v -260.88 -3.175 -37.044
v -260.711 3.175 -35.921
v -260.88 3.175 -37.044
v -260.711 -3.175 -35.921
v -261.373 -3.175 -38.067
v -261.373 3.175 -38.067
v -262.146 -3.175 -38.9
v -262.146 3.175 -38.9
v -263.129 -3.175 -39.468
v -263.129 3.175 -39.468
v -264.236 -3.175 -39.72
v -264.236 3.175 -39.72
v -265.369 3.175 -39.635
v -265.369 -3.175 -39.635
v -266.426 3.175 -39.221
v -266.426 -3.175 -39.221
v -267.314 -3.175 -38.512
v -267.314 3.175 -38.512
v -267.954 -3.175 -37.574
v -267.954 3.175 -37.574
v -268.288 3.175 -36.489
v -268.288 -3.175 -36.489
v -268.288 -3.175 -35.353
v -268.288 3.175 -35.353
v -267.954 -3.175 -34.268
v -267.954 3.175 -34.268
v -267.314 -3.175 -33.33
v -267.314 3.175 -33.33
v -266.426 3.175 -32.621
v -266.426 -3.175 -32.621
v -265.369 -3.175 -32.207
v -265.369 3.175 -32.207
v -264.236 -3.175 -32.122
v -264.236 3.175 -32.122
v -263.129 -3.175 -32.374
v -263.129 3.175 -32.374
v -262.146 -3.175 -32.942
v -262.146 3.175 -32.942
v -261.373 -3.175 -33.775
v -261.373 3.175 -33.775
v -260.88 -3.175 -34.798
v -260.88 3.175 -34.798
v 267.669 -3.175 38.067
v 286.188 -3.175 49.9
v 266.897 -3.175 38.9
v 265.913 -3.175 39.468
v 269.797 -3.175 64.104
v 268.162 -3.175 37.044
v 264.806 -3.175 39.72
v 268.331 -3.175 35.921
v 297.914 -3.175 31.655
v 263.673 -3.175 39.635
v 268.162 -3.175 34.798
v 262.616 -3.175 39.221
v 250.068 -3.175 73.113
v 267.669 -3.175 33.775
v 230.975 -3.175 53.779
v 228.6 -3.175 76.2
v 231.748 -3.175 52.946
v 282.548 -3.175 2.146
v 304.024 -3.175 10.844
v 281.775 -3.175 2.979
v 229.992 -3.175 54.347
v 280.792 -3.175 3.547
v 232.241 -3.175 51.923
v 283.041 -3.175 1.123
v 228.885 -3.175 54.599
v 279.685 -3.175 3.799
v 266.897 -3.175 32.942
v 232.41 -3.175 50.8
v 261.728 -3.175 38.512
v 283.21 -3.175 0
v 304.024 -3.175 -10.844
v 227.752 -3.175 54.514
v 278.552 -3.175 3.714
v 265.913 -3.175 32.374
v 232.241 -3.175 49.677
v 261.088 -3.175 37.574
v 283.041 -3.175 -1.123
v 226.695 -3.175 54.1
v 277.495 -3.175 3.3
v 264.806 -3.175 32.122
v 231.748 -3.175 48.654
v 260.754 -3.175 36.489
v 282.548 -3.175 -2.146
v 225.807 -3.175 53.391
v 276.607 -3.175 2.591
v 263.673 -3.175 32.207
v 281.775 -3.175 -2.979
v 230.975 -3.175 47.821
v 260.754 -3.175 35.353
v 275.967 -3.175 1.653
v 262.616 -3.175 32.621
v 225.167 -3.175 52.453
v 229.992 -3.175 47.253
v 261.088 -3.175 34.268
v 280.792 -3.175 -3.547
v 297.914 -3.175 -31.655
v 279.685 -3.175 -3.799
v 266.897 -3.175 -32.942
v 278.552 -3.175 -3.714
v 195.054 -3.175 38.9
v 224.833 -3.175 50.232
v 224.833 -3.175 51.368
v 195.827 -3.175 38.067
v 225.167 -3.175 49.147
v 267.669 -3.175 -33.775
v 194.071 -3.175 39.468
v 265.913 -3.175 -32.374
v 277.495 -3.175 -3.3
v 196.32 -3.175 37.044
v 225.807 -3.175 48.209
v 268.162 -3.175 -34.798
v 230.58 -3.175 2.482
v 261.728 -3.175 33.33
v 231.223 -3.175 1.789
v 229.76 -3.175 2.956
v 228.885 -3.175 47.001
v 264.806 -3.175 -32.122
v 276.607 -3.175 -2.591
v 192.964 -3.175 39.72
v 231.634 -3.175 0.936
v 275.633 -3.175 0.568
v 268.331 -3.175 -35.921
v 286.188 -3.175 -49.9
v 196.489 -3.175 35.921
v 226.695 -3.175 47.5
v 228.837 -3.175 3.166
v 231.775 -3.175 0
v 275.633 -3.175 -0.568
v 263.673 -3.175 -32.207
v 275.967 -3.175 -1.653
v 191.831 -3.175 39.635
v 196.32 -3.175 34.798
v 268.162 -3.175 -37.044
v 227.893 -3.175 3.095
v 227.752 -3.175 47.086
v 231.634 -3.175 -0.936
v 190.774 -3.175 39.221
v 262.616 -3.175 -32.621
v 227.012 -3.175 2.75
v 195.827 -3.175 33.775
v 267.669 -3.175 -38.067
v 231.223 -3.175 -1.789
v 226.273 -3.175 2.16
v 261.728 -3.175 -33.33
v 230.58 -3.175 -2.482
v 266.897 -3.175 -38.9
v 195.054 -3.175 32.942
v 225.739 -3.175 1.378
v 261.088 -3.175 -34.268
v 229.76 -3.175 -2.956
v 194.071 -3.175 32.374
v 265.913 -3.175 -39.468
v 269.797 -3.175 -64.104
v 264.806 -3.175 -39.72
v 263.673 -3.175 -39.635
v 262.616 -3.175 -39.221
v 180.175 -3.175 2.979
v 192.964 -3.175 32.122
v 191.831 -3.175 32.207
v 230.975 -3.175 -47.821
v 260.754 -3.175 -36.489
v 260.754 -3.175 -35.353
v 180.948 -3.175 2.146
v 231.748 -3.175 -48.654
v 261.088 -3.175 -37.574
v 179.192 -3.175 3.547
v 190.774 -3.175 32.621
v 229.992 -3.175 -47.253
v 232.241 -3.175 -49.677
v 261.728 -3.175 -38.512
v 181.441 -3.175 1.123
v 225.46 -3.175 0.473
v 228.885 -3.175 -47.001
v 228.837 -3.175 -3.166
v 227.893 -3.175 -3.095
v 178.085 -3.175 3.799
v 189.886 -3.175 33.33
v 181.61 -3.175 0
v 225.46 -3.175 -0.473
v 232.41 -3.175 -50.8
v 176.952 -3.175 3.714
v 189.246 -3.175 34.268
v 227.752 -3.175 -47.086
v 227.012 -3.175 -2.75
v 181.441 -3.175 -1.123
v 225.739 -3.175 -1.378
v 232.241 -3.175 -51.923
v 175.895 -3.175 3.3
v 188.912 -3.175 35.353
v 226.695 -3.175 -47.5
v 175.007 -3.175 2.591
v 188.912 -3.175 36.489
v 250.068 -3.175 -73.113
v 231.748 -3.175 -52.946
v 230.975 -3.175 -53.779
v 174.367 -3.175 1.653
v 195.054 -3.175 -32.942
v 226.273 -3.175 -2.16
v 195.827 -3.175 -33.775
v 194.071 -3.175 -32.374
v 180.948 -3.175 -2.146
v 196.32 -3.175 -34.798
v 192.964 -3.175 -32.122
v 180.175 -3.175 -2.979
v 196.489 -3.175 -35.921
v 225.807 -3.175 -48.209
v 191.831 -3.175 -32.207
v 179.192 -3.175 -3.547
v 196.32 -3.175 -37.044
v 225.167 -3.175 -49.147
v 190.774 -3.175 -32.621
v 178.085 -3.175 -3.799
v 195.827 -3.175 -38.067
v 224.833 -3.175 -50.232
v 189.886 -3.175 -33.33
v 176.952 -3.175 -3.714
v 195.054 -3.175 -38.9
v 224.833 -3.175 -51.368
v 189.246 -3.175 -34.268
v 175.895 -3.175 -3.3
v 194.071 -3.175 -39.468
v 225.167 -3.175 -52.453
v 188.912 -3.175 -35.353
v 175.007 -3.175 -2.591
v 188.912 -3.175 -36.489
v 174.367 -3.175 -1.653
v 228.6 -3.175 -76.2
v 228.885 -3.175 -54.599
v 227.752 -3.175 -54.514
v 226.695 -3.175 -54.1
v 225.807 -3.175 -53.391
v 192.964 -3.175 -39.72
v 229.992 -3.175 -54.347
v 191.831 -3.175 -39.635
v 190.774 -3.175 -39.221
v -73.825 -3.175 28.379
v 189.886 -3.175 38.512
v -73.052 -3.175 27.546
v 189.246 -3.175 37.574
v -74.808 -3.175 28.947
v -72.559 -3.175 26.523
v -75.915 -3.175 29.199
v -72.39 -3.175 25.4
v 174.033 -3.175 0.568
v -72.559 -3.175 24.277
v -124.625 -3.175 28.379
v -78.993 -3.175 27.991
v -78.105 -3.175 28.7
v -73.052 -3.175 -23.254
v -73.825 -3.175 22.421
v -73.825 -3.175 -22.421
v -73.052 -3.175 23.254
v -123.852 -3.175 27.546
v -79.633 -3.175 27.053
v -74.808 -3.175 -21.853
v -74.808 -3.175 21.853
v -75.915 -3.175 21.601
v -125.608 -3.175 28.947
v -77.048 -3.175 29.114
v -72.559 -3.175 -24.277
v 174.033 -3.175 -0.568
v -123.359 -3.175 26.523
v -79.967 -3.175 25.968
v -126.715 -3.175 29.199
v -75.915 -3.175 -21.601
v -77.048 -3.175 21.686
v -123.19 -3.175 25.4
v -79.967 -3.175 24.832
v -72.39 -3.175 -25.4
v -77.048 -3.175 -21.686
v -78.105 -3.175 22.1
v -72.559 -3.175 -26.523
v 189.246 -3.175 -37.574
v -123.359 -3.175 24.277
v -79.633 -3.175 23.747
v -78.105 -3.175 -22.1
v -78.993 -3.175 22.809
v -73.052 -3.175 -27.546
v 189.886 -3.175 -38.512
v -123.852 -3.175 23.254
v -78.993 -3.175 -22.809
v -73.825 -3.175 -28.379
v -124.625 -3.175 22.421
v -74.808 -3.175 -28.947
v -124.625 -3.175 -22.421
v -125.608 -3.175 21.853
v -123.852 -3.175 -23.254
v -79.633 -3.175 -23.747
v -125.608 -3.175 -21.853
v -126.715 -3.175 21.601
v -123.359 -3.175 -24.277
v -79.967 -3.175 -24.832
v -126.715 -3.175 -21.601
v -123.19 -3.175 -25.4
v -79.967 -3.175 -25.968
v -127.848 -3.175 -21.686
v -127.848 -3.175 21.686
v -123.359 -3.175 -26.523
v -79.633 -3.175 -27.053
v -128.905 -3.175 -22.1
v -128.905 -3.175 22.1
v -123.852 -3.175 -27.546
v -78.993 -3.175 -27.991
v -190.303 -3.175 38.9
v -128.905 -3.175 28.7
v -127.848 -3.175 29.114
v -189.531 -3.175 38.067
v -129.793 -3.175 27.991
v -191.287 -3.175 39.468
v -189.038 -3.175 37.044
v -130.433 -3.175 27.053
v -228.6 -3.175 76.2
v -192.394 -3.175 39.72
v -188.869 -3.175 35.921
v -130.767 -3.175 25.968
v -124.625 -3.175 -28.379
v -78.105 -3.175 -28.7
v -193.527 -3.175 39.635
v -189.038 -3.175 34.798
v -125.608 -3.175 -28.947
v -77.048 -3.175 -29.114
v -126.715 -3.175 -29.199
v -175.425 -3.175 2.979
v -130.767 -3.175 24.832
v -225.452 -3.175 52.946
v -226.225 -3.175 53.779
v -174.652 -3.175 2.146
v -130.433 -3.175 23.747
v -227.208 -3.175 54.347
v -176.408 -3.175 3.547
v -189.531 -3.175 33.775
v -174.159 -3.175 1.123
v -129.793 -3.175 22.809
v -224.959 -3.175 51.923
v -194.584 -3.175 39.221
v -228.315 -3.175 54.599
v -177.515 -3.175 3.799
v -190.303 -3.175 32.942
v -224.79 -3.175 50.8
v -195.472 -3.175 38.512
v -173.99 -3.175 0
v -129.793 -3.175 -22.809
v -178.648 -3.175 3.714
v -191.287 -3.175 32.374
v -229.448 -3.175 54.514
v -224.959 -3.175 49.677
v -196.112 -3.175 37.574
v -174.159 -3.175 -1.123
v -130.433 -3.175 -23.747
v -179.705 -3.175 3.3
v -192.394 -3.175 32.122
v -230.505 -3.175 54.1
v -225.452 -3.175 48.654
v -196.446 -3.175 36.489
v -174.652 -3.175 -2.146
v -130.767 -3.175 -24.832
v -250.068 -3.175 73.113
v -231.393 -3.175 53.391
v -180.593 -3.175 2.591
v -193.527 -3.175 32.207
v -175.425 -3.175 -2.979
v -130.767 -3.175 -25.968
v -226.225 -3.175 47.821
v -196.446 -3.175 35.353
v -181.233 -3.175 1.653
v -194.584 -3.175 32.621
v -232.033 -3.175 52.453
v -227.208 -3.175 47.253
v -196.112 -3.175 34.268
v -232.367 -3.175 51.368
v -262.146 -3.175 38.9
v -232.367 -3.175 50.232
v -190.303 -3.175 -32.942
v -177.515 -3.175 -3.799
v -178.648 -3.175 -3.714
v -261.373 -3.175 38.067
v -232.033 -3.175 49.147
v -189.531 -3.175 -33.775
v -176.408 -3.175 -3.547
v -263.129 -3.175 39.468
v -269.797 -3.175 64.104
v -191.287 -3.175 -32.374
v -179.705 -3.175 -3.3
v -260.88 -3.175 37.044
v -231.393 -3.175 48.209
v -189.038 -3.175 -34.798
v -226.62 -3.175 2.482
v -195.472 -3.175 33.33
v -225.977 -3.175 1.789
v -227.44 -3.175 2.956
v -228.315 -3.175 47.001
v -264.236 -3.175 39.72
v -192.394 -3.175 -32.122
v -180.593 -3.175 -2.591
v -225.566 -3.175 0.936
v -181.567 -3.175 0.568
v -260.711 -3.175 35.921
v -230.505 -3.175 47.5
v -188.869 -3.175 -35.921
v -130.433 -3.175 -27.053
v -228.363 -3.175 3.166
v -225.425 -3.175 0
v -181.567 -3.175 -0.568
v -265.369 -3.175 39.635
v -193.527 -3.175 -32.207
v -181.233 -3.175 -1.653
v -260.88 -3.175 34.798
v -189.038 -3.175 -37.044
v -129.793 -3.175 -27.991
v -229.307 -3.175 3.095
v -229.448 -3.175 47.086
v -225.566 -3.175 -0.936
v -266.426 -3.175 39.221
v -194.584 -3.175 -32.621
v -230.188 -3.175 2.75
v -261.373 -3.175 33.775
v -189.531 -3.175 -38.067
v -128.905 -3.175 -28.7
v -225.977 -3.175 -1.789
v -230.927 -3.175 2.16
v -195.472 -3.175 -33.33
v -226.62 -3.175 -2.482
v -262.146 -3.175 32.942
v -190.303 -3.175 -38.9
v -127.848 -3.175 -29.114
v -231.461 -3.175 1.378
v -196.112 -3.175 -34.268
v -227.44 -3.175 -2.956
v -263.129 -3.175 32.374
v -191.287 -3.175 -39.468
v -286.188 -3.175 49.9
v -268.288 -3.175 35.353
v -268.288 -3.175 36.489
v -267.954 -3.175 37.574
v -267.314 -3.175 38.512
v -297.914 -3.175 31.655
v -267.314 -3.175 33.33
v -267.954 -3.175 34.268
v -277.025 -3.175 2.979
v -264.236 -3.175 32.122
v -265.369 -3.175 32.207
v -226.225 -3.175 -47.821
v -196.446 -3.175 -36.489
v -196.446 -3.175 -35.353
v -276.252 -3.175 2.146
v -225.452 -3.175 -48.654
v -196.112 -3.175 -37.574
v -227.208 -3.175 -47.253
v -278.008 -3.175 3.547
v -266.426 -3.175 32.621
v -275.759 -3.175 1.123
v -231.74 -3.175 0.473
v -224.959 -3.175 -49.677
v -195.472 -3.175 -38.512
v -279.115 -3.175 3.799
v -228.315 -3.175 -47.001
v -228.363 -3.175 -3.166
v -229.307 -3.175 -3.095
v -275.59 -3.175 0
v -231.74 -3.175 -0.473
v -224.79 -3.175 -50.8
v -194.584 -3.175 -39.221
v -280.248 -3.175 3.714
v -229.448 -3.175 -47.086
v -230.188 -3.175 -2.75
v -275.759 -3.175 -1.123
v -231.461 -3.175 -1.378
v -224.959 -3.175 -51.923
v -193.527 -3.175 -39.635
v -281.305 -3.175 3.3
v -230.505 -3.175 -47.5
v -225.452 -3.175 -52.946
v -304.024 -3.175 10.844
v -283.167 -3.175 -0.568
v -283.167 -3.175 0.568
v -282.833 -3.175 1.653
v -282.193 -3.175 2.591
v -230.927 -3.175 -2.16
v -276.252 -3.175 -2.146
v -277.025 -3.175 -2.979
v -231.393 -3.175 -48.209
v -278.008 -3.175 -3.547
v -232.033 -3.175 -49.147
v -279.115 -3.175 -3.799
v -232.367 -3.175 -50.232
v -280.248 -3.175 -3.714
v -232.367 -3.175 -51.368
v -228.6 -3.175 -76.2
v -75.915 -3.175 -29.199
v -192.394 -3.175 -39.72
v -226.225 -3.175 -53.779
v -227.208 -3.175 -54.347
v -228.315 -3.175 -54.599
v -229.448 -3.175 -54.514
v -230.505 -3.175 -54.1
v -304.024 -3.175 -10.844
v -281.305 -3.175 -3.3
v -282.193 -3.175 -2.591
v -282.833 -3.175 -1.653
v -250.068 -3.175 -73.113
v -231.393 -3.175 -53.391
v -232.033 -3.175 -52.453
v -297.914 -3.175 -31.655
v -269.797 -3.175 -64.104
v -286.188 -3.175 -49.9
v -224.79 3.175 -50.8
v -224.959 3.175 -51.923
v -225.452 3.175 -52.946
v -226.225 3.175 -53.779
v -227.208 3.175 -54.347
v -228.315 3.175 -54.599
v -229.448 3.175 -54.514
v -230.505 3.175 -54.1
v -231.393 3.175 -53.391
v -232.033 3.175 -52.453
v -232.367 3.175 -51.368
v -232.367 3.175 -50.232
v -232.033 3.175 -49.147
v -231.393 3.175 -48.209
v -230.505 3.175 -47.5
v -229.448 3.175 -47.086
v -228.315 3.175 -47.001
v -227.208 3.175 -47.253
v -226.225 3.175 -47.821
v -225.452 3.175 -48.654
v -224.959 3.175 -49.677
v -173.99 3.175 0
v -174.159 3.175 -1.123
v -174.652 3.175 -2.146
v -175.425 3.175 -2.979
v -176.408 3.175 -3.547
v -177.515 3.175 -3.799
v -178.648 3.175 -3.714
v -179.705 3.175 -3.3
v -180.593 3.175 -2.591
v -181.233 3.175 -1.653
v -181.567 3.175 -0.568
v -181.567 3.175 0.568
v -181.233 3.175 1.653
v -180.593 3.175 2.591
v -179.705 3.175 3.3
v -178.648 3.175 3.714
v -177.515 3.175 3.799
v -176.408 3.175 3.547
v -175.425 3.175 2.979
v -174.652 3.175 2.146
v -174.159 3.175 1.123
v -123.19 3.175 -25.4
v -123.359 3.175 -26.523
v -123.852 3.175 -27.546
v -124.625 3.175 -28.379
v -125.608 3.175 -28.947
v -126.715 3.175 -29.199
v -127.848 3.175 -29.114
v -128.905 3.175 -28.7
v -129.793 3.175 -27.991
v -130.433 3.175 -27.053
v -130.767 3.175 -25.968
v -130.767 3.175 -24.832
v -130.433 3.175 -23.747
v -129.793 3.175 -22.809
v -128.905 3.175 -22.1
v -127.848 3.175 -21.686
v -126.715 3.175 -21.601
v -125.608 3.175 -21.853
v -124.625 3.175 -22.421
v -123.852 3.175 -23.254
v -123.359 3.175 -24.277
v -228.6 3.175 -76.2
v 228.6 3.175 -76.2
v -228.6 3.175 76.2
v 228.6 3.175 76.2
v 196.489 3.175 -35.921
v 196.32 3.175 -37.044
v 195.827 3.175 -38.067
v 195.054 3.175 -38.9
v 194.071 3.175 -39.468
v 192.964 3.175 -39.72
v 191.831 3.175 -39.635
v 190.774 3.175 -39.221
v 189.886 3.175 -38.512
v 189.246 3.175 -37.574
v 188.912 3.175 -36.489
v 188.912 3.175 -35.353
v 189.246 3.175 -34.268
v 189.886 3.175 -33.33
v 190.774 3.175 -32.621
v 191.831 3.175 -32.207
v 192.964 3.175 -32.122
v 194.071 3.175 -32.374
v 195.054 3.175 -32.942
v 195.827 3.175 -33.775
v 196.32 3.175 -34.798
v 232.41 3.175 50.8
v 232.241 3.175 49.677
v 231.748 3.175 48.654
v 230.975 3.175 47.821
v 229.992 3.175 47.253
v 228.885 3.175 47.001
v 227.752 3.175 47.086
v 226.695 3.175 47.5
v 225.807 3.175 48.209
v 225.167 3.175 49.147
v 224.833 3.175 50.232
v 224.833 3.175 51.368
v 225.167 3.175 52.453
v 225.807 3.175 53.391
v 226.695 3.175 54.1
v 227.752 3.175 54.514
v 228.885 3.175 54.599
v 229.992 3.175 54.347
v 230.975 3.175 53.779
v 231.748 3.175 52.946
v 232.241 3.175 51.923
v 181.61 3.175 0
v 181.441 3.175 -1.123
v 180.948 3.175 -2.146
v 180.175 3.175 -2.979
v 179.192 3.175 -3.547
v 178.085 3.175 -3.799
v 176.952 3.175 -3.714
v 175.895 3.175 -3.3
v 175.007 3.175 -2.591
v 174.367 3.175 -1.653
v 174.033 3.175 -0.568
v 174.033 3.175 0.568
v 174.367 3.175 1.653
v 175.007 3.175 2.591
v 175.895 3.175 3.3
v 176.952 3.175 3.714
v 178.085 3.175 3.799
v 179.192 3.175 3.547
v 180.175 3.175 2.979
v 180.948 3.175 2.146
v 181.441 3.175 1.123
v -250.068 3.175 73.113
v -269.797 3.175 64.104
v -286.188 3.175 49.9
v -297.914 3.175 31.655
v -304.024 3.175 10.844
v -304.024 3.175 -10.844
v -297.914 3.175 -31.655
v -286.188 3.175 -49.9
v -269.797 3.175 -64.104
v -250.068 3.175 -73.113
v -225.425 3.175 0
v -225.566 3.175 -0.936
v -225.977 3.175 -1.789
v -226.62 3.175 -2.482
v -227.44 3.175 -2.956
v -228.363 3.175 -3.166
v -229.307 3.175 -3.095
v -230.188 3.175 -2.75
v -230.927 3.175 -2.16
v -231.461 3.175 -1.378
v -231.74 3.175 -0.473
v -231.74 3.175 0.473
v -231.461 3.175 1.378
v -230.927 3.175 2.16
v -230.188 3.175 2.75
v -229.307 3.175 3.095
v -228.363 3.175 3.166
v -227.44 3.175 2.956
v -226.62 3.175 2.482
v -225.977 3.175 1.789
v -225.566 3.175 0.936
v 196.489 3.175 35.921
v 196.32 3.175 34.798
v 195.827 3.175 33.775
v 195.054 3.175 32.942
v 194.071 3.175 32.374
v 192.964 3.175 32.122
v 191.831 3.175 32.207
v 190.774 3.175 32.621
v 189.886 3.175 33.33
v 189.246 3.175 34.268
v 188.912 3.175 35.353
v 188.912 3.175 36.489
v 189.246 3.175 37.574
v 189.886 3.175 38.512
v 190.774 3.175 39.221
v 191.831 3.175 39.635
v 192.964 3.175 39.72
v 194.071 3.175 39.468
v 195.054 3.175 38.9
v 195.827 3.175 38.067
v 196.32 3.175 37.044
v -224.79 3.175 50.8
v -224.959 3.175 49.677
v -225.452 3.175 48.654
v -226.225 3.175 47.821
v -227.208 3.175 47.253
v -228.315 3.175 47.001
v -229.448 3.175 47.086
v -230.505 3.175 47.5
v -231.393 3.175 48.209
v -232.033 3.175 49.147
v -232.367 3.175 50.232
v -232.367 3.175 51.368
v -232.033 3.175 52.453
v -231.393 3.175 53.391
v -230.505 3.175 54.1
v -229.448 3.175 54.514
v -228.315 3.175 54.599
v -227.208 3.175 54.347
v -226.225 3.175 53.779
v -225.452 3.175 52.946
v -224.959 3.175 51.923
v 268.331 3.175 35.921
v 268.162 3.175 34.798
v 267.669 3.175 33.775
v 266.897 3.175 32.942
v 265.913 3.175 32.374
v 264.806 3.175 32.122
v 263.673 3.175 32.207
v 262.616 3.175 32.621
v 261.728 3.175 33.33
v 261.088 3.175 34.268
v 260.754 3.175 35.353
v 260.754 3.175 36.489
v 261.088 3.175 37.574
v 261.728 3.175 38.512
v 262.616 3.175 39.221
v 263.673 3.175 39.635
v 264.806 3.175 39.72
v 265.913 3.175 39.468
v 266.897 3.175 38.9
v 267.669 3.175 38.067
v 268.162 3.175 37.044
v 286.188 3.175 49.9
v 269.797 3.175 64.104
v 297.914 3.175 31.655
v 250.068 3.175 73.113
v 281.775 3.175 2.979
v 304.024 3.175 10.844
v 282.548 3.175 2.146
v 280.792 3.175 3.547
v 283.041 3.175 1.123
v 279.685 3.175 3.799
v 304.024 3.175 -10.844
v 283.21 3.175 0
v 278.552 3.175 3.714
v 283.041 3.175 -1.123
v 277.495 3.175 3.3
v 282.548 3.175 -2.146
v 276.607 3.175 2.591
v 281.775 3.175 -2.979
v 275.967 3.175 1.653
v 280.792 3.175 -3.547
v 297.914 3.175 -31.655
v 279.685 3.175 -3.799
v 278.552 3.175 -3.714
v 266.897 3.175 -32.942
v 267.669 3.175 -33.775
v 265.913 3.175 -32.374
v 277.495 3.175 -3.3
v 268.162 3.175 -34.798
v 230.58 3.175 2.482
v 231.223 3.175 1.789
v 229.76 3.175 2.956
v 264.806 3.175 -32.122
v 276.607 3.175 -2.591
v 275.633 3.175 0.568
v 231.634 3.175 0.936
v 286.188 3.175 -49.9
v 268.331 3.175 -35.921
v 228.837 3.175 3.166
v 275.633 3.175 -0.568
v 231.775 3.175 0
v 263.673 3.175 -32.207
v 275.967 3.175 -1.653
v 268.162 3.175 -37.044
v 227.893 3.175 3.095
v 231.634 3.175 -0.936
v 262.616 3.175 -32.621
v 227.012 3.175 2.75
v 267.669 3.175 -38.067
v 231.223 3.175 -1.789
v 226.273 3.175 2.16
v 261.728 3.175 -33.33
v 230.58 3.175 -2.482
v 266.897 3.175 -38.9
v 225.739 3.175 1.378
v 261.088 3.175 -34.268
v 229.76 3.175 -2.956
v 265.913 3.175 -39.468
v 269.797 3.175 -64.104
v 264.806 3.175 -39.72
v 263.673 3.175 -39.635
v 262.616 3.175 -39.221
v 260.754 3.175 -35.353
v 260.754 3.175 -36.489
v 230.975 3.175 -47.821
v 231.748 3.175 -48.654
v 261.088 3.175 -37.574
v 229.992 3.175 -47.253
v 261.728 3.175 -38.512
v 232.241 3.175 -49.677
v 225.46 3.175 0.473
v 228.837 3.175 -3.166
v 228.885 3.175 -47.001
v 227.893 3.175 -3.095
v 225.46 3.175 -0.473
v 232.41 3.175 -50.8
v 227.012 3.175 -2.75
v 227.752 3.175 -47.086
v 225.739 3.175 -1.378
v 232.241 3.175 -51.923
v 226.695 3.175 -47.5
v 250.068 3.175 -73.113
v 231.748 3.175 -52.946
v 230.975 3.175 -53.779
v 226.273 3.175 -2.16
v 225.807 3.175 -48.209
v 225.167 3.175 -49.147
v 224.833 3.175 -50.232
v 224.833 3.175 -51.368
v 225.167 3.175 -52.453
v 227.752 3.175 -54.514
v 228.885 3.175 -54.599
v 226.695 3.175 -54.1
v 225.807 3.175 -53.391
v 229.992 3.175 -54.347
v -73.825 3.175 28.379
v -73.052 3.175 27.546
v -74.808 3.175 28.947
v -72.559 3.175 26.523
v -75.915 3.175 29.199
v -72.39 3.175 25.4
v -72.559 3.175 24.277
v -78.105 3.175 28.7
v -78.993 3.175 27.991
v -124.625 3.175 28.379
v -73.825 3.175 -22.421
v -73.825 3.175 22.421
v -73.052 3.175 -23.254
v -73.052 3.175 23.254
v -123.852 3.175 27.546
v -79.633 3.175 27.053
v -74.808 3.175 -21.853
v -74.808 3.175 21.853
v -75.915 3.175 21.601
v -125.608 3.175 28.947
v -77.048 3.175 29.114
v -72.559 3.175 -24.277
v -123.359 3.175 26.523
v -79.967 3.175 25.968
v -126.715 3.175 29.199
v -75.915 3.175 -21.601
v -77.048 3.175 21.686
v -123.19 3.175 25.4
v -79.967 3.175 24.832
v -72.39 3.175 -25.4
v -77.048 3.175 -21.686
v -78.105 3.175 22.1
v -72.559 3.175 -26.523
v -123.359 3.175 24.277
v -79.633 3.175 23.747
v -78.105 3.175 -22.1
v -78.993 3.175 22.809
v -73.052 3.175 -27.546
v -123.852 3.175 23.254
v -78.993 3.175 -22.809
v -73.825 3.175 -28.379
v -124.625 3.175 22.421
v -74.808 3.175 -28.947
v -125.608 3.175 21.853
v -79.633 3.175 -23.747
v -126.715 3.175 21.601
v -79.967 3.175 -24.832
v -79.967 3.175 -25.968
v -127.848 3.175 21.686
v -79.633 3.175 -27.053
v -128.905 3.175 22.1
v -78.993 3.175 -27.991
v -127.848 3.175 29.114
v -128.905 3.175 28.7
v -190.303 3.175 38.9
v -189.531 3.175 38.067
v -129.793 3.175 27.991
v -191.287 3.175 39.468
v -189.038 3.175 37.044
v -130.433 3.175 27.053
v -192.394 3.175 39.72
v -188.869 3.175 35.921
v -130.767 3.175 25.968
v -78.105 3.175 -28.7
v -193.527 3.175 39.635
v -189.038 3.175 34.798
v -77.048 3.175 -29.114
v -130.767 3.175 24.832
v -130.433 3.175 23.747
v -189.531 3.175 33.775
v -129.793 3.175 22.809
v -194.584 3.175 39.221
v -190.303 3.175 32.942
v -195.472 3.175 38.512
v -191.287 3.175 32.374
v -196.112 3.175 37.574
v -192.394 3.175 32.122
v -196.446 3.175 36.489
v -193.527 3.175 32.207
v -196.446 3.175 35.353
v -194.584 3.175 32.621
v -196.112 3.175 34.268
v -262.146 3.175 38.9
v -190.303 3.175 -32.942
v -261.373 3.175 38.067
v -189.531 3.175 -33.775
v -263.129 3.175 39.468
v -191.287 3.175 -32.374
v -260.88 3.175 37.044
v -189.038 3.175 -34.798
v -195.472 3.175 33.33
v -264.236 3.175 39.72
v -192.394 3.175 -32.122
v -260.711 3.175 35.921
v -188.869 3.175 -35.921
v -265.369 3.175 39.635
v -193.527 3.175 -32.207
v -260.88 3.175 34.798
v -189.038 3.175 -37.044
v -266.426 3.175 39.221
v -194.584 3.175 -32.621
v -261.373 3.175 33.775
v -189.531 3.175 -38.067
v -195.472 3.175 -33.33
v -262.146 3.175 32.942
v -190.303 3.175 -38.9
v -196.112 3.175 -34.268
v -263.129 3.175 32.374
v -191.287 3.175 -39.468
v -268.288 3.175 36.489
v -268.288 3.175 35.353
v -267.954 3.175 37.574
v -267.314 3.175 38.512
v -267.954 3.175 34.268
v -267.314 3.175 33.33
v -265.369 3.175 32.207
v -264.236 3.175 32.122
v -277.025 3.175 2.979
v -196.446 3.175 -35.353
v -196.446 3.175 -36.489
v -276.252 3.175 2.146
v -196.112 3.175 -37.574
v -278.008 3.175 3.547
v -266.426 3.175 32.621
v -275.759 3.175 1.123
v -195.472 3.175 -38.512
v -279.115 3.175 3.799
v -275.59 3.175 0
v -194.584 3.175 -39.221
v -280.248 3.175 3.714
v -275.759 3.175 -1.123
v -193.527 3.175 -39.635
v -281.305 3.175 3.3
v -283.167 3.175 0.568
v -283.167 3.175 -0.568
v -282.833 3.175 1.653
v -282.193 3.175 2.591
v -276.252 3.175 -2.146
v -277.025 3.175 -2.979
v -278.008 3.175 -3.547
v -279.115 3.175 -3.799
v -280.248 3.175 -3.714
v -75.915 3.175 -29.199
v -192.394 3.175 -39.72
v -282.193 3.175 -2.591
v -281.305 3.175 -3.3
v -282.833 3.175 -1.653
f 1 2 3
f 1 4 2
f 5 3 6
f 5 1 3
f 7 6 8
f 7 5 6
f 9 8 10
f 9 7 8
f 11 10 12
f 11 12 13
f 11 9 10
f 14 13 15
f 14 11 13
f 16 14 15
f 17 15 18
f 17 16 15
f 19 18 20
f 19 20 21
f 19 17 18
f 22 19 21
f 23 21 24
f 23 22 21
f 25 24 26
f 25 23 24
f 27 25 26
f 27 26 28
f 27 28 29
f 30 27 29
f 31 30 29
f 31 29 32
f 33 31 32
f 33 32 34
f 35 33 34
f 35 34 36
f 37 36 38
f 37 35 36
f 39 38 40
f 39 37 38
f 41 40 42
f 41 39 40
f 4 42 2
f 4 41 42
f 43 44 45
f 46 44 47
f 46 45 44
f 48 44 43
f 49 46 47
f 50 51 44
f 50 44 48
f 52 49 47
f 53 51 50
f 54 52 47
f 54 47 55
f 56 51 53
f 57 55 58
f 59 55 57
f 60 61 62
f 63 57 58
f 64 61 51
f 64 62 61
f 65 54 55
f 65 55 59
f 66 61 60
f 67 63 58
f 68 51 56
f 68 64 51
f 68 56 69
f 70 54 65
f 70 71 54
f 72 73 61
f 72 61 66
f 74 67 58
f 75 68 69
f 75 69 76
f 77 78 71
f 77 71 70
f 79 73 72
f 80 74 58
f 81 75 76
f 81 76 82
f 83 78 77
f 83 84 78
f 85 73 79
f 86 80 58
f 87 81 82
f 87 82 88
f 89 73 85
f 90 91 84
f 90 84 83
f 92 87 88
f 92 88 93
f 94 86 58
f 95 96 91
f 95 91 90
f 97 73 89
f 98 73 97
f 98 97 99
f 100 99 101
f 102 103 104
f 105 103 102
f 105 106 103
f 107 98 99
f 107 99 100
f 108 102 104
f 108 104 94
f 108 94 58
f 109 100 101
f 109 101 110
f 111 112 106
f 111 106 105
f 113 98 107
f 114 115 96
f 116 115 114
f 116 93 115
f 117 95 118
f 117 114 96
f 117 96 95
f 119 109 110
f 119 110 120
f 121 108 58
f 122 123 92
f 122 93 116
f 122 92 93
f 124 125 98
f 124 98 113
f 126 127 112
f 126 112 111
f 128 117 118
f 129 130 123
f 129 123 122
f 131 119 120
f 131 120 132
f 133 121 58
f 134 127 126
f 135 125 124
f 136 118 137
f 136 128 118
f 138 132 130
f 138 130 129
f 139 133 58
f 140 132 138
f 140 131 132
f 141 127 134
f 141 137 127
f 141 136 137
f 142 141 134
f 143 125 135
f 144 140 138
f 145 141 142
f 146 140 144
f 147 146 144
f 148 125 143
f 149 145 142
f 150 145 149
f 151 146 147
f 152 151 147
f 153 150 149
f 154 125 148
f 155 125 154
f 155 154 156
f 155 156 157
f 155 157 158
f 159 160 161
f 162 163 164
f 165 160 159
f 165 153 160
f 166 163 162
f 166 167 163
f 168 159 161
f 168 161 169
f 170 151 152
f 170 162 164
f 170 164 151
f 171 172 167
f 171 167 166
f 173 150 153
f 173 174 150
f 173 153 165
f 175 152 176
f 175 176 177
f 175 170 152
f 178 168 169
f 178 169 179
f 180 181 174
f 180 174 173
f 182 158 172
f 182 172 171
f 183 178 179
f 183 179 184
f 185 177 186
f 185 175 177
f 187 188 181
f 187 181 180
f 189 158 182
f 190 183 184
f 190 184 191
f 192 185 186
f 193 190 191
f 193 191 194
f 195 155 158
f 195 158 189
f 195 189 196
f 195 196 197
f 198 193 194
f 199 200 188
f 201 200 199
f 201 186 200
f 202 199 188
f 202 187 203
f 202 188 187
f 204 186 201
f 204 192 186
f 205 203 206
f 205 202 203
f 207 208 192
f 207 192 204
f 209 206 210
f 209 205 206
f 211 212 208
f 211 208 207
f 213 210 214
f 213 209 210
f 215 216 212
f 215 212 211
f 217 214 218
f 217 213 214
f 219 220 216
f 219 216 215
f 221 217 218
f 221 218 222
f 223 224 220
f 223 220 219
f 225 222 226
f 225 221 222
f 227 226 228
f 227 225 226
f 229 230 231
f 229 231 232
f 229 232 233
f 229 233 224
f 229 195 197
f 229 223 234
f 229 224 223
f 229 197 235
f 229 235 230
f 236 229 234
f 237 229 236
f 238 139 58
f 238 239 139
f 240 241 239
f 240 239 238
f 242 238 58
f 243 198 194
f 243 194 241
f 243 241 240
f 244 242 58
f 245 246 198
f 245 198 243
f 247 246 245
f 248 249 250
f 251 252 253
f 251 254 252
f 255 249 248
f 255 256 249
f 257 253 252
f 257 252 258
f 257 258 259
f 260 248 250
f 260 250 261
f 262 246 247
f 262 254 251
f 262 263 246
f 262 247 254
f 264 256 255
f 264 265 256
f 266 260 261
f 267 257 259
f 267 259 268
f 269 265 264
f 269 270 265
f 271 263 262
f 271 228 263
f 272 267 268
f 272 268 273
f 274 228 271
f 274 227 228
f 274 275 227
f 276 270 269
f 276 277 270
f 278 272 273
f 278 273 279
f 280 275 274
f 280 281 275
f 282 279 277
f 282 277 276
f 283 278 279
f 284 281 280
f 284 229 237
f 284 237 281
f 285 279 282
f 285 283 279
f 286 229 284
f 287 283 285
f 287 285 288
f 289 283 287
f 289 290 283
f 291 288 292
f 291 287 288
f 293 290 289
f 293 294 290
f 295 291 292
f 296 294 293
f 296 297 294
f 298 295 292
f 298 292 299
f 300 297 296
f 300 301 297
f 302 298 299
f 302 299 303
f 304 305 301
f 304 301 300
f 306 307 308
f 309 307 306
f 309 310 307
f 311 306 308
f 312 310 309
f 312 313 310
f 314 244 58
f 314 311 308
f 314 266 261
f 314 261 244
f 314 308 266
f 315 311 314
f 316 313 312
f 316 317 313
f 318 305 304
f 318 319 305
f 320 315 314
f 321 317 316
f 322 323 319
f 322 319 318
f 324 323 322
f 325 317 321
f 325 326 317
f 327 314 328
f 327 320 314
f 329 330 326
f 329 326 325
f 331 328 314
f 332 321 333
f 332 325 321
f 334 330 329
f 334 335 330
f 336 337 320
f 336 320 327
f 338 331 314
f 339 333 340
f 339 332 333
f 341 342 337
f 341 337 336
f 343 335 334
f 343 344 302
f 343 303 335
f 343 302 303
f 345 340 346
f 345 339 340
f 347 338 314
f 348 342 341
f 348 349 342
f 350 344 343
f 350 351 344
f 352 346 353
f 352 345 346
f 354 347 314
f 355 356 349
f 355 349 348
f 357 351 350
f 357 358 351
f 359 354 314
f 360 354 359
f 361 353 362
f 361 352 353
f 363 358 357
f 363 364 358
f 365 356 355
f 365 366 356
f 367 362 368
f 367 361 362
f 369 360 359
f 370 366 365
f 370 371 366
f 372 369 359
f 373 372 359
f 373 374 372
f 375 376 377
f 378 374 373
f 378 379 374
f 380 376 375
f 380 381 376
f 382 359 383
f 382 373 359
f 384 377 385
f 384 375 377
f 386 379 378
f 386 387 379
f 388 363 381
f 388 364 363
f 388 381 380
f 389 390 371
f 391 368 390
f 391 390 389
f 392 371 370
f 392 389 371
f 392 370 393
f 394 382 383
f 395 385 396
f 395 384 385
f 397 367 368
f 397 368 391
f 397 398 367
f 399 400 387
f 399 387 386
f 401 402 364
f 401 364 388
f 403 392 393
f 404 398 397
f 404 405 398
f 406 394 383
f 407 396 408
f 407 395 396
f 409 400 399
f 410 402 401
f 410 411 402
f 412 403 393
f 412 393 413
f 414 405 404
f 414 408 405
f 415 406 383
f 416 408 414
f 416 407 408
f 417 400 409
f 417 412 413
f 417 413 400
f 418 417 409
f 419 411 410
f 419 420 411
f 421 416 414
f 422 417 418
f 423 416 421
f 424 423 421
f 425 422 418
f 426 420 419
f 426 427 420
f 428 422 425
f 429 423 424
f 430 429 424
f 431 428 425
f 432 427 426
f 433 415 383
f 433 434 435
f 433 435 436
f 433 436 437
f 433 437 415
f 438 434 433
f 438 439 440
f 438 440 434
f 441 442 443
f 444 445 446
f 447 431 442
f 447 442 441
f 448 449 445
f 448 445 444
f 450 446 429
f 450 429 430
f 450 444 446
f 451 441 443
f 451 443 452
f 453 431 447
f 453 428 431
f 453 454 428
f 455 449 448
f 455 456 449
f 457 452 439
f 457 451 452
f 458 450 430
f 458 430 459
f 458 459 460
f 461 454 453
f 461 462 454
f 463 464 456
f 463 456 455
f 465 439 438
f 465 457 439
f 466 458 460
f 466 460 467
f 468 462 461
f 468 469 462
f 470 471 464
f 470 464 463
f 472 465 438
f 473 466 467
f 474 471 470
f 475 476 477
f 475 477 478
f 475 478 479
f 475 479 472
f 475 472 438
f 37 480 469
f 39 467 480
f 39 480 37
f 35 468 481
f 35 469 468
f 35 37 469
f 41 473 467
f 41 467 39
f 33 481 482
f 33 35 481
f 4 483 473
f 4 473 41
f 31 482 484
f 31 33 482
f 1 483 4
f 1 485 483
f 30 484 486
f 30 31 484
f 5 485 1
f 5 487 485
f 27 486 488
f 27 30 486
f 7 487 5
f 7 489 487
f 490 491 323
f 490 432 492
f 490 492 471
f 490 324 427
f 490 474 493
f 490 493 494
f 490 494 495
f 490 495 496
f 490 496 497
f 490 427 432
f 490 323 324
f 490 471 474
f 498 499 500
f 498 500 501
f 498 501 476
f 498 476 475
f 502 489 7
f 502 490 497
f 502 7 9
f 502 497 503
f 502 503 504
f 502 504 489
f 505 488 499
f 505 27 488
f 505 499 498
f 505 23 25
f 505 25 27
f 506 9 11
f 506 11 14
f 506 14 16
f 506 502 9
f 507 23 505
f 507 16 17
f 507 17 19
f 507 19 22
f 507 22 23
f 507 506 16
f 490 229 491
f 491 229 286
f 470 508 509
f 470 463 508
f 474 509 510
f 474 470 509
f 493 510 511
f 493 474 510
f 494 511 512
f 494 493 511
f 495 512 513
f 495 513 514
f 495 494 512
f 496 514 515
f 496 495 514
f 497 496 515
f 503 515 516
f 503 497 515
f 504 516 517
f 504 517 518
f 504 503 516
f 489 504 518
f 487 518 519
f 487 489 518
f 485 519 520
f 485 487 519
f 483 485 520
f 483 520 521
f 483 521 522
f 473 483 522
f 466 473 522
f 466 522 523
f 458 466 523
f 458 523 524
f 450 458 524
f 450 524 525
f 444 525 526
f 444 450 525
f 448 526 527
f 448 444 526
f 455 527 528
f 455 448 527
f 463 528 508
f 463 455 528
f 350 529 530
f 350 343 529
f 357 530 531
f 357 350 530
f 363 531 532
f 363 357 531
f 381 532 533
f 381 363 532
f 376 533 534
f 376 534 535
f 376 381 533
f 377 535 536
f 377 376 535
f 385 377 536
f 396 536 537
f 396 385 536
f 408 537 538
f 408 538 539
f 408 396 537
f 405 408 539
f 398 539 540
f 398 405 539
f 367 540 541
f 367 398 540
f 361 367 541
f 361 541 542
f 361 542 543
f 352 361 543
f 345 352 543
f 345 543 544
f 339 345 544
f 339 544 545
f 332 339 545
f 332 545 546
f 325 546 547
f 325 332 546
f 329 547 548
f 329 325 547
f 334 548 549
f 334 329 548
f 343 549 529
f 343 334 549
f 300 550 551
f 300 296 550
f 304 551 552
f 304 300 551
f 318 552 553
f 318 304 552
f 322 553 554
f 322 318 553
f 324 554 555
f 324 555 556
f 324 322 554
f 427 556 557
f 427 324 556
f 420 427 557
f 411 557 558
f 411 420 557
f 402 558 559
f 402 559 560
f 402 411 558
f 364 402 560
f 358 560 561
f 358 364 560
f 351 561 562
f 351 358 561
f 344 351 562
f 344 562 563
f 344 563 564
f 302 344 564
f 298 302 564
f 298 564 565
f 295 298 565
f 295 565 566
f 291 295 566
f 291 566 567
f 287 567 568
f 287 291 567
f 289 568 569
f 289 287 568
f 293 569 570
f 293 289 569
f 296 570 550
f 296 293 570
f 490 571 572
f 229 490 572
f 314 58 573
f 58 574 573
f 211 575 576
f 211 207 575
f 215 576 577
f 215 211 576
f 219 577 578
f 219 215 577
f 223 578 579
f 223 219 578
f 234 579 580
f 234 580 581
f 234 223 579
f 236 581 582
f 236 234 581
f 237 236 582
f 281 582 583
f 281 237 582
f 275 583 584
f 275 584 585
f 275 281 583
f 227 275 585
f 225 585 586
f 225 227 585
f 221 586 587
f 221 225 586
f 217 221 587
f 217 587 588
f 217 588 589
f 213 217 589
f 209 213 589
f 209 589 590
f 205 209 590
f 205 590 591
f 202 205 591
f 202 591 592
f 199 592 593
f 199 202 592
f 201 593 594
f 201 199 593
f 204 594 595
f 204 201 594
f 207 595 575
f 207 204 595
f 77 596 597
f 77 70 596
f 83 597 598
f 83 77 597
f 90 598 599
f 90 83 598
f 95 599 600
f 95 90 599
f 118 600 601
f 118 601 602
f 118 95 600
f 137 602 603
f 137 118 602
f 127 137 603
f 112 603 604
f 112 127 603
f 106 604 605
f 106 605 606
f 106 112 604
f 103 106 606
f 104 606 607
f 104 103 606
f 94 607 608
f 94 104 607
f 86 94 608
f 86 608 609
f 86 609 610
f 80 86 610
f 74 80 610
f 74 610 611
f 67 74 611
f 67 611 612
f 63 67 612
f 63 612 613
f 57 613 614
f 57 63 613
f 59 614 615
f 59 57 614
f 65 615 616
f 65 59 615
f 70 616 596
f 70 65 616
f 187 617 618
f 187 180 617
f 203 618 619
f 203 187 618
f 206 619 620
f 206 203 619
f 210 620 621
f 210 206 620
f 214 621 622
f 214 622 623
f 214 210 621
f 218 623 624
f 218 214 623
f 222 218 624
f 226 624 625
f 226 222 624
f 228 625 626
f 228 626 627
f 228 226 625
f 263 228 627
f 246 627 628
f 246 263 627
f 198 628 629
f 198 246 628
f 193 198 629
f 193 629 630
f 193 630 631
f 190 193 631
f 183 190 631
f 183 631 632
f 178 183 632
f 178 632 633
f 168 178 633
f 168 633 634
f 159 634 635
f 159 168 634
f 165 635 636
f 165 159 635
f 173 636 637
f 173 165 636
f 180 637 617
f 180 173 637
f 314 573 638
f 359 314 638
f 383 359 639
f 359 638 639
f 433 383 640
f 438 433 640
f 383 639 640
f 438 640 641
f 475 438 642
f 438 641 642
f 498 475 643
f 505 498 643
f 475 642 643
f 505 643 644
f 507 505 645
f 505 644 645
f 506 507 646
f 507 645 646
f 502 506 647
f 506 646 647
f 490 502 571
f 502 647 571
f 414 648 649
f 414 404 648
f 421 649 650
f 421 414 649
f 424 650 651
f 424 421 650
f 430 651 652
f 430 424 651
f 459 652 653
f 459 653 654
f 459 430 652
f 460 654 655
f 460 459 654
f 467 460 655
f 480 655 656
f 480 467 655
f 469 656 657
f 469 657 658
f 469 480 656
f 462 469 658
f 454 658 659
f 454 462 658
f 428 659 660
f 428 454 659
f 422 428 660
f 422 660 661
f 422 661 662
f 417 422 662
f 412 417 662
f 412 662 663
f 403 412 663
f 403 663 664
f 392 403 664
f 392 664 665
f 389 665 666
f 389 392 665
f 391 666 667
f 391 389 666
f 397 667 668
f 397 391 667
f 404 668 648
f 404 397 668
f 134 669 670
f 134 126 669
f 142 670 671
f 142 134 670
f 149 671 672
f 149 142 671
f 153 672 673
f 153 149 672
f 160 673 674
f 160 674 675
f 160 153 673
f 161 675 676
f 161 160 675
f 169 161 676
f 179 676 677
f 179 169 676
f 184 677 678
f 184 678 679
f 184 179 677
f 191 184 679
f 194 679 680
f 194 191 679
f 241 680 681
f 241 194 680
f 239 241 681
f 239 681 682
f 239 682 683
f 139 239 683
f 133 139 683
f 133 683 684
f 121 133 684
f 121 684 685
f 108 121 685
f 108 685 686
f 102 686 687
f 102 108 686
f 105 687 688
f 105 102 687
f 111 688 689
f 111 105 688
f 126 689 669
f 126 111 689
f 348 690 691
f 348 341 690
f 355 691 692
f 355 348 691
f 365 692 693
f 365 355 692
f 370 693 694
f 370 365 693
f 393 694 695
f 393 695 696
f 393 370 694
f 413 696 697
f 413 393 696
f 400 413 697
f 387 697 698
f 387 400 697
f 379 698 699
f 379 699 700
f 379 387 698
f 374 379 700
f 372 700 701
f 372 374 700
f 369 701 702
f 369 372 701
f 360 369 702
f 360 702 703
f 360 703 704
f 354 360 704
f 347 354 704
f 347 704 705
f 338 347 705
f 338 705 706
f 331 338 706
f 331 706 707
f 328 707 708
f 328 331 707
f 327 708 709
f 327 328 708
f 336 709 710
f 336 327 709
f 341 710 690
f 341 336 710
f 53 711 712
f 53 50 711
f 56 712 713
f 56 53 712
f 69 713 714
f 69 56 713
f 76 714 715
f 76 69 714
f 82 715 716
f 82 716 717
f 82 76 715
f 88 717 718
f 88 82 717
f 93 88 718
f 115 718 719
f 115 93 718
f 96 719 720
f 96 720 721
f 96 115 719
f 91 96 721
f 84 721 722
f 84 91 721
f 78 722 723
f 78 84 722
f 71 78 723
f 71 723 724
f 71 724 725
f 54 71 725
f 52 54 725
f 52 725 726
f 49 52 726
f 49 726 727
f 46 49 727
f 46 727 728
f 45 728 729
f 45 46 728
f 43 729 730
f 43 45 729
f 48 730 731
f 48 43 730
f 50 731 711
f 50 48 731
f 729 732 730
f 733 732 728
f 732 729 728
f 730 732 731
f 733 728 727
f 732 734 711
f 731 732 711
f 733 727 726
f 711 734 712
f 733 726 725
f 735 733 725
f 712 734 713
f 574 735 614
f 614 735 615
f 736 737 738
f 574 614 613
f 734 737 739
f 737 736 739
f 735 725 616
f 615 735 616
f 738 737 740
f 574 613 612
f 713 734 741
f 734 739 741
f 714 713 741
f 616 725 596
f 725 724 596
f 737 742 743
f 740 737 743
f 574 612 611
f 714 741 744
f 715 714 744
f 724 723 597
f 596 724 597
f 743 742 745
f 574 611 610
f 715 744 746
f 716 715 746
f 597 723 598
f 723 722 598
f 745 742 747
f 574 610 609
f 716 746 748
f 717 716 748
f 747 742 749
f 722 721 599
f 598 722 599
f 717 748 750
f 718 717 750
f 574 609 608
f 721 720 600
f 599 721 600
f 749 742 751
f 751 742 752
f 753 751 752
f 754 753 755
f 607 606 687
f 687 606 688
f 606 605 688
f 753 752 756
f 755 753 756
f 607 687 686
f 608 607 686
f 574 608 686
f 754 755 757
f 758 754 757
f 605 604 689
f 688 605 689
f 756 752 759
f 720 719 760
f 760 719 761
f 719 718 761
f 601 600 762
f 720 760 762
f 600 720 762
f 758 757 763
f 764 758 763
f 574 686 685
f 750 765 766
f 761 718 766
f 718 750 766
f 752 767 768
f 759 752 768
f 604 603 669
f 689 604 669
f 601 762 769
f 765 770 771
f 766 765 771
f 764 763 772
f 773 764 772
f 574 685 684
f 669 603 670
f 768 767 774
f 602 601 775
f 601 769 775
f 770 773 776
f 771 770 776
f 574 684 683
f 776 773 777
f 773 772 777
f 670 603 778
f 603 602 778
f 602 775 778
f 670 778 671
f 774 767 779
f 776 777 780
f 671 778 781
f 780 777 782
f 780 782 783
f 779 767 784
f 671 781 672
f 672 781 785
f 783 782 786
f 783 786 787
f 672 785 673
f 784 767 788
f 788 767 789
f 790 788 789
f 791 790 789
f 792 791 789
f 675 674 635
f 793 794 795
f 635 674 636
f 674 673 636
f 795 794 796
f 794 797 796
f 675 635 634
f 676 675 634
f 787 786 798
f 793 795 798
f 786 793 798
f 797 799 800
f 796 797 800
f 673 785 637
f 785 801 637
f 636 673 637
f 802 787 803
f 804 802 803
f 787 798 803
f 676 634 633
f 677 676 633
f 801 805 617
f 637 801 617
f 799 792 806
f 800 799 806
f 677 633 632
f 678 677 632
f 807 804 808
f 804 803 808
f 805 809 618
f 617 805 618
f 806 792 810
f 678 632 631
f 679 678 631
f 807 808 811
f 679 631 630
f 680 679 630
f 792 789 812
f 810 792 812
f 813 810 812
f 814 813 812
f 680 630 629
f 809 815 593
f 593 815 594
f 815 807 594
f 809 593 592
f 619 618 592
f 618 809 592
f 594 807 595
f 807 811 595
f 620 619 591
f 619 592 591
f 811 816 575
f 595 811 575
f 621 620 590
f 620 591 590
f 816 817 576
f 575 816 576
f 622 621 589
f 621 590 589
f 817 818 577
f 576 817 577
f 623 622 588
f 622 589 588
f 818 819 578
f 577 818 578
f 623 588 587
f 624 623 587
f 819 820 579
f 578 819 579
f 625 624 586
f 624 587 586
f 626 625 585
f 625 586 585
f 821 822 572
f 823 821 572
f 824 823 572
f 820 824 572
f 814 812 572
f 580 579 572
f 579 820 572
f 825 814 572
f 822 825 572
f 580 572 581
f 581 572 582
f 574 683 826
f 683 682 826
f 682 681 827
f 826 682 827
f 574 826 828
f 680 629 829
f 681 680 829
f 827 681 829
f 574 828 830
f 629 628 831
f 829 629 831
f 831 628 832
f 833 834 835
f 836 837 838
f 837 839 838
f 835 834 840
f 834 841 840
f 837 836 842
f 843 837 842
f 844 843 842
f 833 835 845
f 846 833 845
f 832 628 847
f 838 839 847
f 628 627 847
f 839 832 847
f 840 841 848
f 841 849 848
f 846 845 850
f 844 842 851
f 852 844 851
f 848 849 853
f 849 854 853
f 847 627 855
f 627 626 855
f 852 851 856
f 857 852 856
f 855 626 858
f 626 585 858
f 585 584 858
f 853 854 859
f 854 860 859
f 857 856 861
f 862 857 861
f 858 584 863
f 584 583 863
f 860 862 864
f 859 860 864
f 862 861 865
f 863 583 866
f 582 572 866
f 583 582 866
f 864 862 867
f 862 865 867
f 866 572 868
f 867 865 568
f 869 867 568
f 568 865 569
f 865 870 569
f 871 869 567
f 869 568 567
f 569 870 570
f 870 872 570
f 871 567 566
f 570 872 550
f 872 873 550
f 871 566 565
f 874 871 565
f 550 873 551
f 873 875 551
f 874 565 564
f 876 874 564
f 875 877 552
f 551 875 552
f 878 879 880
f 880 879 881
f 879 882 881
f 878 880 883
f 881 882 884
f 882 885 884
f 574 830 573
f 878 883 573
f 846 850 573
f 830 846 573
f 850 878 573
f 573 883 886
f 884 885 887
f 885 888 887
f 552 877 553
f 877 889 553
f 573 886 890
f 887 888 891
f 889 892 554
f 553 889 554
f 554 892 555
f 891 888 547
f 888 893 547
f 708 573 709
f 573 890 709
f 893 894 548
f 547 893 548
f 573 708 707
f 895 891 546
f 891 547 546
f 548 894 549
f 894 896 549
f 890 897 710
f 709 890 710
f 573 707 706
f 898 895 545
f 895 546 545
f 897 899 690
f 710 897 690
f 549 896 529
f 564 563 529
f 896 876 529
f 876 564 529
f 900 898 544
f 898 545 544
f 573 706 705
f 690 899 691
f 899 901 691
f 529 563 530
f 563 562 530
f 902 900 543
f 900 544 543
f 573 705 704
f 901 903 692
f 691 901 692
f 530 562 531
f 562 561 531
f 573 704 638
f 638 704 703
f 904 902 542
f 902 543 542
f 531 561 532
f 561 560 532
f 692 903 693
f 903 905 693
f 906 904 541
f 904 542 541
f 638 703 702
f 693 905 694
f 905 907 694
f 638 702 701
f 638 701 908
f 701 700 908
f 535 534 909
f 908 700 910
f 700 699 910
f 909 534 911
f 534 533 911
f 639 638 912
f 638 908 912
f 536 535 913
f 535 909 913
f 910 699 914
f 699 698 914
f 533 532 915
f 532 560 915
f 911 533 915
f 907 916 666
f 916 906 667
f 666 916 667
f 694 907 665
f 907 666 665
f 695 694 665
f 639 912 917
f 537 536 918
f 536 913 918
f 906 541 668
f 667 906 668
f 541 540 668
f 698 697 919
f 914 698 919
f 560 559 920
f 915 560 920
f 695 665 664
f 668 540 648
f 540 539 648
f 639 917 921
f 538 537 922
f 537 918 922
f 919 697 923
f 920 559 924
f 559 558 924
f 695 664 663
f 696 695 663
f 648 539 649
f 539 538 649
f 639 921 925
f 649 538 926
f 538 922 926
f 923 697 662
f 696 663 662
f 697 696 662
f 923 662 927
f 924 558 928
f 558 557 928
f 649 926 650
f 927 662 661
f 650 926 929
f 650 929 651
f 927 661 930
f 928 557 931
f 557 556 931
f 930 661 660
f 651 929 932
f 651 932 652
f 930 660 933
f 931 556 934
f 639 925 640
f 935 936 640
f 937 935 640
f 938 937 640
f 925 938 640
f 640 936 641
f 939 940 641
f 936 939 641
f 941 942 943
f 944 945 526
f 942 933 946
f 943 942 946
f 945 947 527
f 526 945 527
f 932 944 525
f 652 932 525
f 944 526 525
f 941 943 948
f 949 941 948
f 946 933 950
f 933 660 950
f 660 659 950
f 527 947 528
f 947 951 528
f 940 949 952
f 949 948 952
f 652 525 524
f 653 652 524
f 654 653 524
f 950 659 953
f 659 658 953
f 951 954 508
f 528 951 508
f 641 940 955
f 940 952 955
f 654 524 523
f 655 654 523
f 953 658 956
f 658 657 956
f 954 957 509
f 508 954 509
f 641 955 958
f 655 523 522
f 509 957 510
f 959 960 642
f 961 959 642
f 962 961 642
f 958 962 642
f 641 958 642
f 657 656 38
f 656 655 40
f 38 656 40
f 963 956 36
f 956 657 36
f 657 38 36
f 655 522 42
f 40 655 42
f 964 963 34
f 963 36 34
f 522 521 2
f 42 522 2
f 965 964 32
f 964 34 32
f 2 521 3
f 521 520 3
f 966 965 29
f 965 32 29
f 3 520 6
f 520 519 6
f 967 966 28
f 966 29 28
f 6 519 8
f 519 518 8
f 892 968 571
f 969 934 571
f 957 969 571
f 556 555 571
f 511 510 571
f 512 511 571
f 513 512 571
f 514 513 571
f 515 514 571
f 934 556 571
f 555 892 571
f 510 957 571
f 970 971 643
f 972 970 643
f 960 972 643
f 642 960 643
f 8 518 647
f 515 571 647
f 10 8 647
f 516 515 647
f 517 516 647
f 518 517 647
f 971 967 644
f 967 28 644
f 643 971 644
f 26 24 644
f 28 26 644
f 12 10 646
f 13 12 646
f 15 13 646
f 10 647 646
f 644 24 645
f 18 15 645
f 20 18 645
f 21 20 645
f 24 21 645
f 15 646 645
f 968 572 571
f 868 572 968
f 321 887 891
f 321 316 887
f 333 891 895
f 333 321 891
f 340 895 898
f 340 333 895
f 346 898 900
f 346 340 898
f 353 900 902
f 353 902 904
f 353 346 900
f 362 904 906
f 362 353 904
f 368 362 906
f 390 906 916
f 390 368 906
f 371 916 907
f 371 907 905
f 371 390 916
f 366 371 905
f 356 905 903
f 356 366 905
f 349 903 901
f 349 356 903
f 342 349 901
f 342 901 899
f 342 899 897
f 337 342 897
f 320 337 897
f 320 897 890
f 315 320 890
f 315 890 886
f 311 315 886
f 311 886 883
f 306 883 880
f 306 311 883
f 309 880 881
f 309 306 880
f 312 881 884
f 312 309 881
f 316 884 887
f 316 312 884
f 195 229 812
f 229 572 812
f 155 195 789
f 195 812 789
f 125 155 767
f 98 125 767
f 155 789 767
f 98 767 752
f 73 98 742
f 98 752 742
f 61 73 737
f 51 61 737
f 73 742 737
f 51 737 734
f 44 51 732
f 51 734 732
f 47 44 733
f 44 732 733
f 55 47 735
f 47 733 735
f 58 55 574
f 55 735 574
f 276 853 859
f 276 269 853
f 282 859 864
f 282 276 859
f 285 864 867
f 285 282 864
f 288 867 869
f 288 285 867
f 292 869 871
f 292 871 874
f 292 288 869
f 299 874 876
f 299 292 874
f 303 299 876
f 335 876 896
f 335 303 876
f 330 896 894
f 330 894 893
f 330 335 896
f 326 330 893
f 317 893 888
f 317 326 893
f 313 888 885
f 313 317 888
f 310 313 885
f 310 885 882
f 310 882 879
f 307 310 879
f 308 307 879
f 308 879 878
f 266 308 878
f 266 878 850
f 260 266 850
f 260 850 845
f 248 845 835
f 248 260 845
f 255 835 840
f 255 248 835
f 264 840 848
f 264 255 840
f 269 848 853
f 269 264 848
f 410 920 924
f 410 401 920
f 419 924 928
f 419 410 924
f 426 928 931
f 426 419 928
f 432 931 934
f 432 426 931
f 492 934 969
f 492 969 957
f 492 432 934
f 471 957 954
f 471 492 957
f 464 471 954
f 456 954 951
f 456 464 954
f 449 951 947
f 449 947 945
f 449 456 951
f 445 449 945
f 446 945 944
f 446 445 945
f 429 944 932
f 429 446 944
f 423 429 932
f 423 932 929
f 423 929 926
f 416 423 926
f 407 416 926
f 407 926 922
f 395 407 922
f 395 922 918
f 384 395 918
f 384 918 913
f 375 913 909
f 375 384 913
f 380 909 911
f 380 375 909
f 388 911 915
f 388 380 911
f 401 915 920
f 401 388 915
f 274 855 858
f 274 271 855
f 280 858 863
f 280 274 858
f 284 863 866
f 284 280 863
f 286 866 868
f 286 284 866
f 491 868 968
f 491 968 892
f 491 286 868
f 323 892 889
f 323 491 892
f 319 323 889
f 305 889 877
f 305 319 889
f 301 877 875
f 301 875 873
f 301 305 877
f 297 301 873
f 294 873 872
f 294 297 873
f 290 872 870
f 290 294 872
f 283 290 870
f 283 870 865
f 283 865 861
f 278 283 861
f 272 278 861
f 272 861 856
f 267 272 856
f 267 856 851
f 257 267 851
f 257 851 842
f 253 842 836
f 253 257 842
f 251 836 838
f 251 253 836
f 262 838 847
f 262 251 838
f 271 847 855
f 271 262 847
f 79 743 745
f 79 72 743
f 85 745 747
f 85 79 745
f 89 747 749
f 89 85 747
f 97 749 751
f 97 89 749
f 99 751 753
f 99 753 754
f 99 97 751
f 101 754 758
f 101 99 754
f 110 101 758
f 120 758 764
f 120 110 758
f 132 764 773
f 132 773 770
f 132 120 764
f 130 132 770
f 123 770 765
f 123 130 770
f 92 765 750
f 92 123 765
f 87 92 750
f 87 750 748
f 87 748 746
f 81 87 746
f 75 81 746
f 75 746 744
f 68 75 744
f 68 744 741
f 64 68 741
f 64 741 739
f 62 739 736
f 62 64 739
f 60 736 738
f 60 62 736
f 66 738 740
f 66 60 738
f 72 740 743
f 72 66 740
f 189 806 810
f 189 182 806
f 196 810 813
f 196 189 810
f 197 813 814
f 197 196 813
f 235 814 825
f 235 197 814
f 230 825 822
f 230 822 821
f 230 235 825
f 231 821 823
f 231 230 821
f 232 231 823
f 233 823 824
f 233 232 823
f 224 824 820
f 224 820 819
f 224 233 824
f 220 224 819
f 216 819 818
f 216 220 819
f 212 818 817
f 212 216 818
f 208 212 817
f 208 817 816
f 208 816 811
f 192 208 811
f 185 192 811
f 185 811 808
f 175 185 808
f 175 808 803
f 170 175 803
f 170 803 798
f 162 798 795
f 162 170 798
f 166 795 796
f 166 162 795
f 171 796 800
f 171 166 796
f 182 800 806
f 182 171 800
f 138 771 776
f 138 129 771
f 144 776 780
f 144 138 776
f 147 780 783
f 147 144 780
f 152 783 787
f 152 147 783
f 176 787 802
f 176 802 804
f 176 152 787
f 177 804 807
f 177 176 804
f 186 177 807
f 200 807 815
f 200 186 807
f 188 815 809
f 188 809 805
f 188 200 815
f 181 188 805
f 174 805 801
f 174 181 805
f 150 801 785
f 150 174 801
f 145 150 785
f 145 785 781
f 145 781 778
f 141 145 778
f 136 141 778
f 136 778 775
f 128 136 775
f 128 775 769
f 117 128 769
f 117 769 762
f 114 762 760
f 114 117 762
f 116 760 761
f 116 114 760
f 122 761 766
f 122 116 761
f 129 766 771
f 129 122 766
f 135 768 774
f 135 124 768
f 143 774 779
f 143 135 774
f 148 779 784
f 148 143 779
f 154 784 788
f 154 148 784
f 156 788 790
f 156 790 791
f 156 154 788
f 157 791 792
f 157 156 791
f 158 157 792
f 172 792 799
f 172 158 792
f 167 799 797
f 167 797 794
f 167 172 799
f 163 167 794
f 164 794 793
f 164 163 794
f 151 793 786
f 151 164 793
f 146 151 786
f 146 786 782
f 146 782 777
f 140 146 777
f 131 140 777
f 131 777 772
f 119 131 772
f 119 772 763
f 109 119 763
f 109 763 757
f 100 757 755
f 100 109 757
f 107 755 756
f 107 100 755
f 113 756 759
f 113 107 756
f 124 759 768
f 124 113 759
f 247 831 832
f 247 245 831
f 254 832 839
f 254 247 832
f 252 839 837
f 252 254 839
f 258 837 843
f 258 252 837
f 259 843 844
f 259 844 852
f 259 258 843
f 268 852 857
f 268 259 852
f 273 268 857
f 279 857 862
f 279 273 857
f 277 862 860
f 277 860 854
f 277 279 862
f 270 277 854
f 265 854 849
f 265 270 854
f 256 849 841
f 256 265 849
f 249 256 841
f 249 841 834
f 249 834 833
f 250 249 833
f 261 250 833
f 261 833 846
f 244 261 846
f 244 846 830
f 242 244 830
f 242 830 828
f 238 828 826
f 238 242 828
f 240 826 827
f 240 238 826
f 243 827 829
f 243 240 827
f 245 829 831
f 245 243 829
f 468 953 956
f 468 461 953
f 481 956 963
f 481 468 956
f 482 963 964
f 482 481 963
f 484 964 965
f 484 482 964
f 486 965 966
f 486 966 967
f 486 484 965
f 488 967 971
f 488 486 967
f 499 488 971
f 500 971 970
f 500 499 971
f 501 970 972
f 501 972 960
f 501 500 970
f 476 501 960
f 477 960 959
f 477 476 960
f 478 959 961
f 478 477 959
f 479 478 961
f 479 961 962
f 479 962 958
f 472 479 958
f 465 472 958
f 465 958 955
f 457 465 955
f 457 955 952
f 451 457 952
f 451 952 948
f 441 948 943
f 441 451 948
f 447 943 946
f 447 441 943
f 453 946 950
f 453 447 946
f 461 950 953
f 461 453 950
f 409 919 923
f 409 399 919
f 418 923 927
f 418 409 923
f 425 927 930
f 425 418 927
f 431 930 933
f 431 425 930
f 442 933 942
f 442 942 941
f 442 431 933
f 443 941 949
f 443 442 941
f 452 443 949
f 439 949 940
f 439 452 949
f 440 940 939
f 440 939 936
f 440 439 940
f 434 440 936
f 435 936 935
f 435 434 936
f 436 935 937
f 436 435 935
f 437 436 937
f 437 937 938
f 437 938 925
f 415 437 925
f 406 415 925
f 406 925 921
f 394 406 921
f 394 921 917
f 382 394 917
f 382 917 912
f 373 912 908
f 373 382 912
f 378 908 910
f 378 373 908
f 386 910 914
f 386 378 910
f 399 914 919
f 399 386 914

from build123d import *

# Parameters (mm, degrees)
SKETCH1_R           = 3.175
SKETCH1_R_2         = 3.81
BOSS_EXTRUDE1_DEPTH = 3.175


with BuildPart() as part:
    # Sketch1 → Boss-Extrude1 (new body, symmetric)
    with BuildSketch(Plane(origin=(0, 0, 0), x_dir=(1, 0, 0), z_dir=(0, 1, 0))):
        with BuildLine():
            Line((-228.6, 76.2), (228.6, 76.2))
            ThreePointArc((228.6, 76.2), (304.8, 0), (228.6, -76.2))
            Line((228.6, -76.2), (-228.6, -76.2))
            ThreePointArc((-228.6, -76.2), (-304.8, 0), (-228.6, 76.2))
        make_face()
        with Locations((-228.6, 0)):
            Circle(SKETCH1_R, mode=Mode.SUBTRACT)
        with Locations((-228.6, 50.8)):
            Circle(SKETCH1_R_2, mode=Mode.SUBTRACT)
        with Locations((-192.678975516, 35.921024484)):
            Circle(SKETCH1_R_2, mode=Mode.SUBTRACT)
        with Locations((-177.8, 0)):
            Circle(SKETCH1_R_2, mode=Mode.SUBTRACT)
        with Locations((-192.678975516, -35.921024484)):
            Circle(SKETCH1_R_2, mode=Mode.SUBTRACT)
        with Locations((-228.6, -50.8)):
            Circle(SKETCH1_R_2, mode=Mode.SUBTRACT)
        with Locations((-264.521024484, -35.921024484)):
            Circle(SKETCH1_R_2, mode=Mode.SUBTRACT)
        with Locations((-279.4, 0)):
            Circle(SKETCH1_R_2, mode=Mode.SUBTRACT)
        with Locations((-264.521024484, 35.921024484)):
            Circle(SKETCH1_R_2, mode=Mode.SUBTRACT)
        with Locations((228.6, 0)):
            Circle(SKETCH1_R, mode=Mode.SUBTRACT)
        with Locations((279.4, 0)):
            Circle(SKETCH1_R_2, mode=Mode.SUBTRACT)
        with Locations((264.521024484, -35.921024484)):
            Circle(SKETCH1_R_2, mode=Mode.SUBTRACT)
        with Locations((228.6, -50.8)):
            Circle(SKETCH1_R_2, mode=Mode.SUBTRACT)
        with Locations((192.678975516, -35.921024484)):
            Circle(SKETCH1_R_2, mode=Mode.SUBTRACT)
        with Locations((177.8, 0)):
            Circle(SKETCH1_R_2, mode=Mode.SUBTRACT)
        with Locations((192.678975516, 35.921024484)):
            Circle(SKETCH1_R_2, mode=Mode.SUBTRACT)
        with Locations((228.6, 50.8)):
            Circle(SKETCH1_R_2, mode=Mode.SUBTRACT)
        with Locations((264.521024484, 35.921024484)):
            Circle(SKETCH1_R_2, mode=Mode.SUBTRACT)
        with Locations((-127, 25.4)):
            Circle(SKETCH1_R_2, mode=Mode.SUBTRACT)
        with Locations((-76.2, -25.4)):
            Circle(SKETCH1_R_2, mode=Mode.SUBTRACT)
        with Locations((-127, -25.4)):
            Circle(SKETCH1_R_2, mode=Mode.SUBTRACT)
        with Locations((-76.2, 25.4)):
            Circle(SKETCH1_R_2, mode=Mode.SUBTRACT)
    extrude(amount=BOSS_EXTRUDE1_DEPTH, both=True)


solid = part.part
